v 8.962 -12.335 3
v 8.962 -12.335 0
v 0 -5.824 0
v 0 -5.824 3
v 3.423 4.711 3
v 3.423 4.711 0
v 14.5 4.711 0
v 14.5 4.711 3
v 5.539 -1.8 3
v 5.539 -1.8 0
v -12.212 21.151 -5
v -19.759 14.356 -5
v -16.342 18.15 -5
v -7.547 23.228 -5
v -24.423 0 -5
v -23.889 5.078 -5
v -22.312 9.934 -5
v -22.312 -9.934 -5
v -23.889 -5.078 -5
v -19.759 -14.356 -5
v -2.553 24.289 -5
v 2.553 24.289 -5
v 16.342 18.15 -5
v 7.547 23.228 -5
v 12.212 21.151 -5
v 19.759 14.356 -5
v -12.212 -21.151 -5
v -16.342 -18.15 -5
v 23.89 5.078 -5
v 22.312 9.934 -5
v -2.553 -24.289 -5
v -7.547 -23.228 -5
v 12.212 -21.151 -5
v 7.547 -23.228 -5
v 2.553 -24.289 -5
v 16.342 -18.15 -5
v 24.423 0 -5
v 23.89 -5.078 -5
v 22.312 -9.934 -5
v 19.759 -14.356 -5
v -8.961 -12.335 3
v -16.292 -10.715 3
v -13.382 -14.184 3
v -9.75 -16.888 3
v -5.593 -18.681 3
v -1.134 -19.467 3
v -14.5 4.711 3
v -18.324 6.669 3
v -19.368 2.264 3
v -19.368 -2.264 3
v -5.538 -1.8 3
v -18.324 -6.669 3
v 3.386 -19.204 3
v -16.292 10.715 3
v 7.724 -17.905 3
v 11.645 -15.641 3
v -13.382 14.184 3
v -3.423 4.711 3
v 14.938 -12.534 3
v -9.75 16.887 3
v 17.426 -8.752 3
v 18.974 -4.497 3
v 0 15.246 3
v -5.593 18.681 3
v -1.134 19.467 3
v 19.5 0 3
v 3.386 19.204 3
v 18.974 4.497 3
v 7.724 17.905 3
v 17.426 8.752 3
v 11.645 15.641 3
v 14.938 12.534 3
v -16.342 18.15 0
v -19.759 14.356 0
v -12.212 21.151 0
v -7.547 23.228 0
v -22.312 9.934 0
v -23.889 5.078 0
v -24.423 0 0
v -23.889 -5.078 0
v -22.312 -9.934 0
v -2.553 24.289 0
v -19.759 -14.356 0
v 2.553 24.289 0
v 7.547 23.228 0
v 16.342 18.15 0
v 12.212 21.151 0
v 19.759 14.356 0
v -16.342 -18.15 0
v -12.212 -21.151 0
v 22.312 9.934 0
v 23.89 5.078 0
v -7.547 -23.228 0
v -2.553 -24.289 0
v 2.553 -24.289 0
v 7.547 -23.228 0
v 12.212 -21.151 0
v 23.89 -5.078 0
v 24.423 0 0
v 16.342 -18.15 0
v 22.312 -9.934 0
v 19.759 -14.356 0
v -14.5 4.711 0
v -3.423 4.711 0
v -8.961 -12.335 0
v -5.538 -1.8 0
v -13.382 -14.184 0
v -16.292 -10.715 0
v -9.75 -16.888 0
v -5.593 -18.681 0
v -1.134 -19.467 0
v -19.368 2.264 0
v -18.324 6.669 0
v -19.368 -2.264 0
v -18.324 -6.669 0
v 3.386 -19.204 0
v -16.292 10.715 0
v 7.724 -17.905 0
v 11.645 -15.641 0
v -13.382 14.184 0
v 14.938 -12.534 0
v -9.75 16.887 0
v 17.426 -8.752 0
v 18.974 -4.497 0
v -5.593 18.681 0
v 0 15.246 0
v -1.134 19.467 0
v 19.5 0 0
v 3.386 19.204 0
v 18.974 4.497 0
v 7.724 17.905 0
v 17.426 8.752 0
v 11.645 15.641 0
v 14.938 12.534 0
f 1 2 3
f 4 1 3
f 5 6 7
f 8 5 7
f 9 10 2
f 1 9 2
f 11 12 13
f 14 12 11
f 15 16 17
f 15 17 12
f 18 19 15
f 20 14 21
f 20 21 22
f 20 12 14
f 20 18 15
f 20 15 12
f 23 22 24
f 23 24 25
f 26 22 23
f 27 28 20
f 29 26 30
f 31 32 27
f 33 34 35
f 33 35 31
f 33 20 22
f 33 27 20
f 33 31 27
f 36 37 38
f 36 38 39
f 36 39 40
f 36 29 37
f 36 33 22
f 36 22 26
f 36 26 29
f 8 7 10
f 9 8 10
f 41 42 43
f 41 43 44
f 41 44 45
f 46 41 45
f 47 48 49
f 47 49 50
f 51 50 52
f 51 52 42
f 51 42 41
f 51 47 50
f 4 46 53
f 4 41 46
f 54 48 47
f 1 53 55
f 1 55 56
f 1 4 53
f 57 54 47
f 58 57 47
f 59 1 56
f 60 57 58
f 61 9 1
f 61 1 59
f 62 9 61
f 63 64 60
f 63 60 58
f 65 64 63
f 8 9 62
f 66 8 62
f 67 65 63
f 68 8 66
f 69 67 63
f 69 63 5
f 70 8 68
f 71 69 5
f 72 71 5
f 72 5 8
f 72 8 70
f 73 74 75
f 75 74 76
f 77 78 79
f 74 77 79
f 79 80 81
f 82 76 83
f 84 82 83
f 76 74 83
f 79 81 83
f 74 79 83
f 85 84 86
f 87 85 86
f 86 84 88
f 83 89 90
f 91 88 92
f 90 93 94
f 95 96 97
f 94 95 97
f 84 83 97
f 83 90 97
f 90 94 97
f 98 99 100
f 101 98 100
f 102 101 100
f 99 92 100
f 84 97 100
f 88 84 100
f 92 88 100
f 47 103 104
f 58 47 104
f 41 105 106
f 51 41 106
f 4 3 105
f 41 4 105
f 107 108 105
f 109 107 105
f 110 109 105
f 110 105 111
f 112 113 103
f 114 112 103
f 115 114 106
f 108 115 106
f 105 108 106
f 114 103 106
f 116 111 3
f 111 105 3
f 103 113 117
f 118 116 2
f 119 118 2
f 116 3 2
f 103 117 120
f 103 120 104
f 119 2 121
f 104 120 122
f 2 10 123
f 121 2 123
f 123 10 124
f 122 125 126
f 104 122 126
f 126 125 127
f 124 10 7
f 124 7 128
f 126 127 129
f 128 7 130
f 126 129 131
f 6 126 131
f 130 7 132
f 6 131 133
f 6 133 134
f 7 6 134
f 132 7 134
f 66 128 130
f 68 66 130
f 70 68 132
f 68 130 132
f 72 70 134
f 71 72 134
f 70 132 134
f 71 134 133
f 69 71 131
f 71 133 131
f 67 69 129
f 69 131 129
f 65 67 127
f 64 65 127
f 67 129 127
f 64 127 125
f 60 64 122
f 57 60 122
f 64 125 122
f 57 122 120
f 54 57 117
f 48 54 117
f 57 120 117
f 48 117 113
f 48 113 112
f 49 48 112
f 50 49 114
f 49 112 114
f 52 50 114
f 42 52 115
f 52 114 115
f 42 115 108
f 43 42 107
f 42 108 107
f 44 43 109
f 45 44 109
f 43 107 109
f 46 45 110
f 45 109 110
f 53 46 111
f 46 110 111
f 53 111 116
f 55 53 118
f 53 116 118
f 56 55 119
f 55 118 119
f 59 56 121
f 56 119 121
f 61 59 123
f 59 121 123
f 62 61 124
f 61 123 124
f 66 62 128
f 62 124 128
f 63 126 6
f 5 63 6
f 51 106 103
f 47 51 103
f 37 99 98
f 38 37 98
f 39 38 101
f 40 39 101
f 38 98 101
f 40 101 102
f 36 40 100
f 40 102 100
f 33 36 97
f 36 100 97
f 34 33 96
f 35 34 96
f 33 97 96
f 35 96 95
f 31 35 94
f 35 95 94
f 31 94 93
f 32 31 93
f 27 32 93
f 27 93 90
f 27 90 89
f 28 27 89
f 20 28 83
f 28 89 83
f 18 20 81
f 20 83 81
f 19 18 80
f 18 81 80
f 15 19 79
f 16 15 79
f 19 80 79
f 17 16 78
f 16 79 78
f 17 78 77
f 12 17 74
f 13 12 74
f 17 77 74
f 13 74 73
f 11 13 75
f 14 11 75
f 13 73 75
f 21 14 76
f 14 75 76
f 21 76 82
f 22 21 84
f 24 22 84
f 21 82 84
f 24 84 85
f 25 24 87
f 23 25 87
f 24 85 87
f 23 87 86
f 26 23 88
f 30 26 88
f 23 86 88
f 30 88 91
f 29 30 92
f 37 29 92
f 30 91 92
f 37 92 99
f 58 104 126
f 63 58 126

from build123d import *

# Parameters (mm, degrees)
F0_R     = 19.5
F1_DEPTH = 3
F2_R     = 24.4231791104
F3_DEPTH = 5


# Not quite as in the source:
# - a feature of the source that left no trace in its solid (it failed there, or was rolled back) is left out


with BuildPart() as f1:
    # F0 (on Top) → F1 (new body)
    with BuildSketch(Plane.XY):
        with Locations((6.52368e-05, -6.45803e-05)):
            Circle(F0_R)
        Polygon((6.52368e-05, -5.823595641), (-8.9614276, -12.3345013014), (-5.5384419263, -1.7996346453), (-14.4999347632, 4.7112710151), (-3.4229204369, 4.7112710151), (6.52368e-05, 15.2461376711), (3.4230509106, 4.7112710151), (14.5000652368, 4.7112710151), (5.5385724, -1.7996346453), (8.9615580737, -12.3345013014), align=None, mode=Mode.SUBTRACT)
    extrude(amount=F1_DEPTH)


with BuildPart() as f3:
    # F2 (on face) → F3 (new body)
    with BuildSketch(Plane(origin=(0, 0, 0), x_dir=(1, 0, 0), z_dir=(0, 0, -1))):
        with Locations((6.52368e-05, 6.45803e-05)):
            Circle(F2_R)
    extrude(amount=F3_DEPTH)


solid = Compound([f1.part, f3.part])
